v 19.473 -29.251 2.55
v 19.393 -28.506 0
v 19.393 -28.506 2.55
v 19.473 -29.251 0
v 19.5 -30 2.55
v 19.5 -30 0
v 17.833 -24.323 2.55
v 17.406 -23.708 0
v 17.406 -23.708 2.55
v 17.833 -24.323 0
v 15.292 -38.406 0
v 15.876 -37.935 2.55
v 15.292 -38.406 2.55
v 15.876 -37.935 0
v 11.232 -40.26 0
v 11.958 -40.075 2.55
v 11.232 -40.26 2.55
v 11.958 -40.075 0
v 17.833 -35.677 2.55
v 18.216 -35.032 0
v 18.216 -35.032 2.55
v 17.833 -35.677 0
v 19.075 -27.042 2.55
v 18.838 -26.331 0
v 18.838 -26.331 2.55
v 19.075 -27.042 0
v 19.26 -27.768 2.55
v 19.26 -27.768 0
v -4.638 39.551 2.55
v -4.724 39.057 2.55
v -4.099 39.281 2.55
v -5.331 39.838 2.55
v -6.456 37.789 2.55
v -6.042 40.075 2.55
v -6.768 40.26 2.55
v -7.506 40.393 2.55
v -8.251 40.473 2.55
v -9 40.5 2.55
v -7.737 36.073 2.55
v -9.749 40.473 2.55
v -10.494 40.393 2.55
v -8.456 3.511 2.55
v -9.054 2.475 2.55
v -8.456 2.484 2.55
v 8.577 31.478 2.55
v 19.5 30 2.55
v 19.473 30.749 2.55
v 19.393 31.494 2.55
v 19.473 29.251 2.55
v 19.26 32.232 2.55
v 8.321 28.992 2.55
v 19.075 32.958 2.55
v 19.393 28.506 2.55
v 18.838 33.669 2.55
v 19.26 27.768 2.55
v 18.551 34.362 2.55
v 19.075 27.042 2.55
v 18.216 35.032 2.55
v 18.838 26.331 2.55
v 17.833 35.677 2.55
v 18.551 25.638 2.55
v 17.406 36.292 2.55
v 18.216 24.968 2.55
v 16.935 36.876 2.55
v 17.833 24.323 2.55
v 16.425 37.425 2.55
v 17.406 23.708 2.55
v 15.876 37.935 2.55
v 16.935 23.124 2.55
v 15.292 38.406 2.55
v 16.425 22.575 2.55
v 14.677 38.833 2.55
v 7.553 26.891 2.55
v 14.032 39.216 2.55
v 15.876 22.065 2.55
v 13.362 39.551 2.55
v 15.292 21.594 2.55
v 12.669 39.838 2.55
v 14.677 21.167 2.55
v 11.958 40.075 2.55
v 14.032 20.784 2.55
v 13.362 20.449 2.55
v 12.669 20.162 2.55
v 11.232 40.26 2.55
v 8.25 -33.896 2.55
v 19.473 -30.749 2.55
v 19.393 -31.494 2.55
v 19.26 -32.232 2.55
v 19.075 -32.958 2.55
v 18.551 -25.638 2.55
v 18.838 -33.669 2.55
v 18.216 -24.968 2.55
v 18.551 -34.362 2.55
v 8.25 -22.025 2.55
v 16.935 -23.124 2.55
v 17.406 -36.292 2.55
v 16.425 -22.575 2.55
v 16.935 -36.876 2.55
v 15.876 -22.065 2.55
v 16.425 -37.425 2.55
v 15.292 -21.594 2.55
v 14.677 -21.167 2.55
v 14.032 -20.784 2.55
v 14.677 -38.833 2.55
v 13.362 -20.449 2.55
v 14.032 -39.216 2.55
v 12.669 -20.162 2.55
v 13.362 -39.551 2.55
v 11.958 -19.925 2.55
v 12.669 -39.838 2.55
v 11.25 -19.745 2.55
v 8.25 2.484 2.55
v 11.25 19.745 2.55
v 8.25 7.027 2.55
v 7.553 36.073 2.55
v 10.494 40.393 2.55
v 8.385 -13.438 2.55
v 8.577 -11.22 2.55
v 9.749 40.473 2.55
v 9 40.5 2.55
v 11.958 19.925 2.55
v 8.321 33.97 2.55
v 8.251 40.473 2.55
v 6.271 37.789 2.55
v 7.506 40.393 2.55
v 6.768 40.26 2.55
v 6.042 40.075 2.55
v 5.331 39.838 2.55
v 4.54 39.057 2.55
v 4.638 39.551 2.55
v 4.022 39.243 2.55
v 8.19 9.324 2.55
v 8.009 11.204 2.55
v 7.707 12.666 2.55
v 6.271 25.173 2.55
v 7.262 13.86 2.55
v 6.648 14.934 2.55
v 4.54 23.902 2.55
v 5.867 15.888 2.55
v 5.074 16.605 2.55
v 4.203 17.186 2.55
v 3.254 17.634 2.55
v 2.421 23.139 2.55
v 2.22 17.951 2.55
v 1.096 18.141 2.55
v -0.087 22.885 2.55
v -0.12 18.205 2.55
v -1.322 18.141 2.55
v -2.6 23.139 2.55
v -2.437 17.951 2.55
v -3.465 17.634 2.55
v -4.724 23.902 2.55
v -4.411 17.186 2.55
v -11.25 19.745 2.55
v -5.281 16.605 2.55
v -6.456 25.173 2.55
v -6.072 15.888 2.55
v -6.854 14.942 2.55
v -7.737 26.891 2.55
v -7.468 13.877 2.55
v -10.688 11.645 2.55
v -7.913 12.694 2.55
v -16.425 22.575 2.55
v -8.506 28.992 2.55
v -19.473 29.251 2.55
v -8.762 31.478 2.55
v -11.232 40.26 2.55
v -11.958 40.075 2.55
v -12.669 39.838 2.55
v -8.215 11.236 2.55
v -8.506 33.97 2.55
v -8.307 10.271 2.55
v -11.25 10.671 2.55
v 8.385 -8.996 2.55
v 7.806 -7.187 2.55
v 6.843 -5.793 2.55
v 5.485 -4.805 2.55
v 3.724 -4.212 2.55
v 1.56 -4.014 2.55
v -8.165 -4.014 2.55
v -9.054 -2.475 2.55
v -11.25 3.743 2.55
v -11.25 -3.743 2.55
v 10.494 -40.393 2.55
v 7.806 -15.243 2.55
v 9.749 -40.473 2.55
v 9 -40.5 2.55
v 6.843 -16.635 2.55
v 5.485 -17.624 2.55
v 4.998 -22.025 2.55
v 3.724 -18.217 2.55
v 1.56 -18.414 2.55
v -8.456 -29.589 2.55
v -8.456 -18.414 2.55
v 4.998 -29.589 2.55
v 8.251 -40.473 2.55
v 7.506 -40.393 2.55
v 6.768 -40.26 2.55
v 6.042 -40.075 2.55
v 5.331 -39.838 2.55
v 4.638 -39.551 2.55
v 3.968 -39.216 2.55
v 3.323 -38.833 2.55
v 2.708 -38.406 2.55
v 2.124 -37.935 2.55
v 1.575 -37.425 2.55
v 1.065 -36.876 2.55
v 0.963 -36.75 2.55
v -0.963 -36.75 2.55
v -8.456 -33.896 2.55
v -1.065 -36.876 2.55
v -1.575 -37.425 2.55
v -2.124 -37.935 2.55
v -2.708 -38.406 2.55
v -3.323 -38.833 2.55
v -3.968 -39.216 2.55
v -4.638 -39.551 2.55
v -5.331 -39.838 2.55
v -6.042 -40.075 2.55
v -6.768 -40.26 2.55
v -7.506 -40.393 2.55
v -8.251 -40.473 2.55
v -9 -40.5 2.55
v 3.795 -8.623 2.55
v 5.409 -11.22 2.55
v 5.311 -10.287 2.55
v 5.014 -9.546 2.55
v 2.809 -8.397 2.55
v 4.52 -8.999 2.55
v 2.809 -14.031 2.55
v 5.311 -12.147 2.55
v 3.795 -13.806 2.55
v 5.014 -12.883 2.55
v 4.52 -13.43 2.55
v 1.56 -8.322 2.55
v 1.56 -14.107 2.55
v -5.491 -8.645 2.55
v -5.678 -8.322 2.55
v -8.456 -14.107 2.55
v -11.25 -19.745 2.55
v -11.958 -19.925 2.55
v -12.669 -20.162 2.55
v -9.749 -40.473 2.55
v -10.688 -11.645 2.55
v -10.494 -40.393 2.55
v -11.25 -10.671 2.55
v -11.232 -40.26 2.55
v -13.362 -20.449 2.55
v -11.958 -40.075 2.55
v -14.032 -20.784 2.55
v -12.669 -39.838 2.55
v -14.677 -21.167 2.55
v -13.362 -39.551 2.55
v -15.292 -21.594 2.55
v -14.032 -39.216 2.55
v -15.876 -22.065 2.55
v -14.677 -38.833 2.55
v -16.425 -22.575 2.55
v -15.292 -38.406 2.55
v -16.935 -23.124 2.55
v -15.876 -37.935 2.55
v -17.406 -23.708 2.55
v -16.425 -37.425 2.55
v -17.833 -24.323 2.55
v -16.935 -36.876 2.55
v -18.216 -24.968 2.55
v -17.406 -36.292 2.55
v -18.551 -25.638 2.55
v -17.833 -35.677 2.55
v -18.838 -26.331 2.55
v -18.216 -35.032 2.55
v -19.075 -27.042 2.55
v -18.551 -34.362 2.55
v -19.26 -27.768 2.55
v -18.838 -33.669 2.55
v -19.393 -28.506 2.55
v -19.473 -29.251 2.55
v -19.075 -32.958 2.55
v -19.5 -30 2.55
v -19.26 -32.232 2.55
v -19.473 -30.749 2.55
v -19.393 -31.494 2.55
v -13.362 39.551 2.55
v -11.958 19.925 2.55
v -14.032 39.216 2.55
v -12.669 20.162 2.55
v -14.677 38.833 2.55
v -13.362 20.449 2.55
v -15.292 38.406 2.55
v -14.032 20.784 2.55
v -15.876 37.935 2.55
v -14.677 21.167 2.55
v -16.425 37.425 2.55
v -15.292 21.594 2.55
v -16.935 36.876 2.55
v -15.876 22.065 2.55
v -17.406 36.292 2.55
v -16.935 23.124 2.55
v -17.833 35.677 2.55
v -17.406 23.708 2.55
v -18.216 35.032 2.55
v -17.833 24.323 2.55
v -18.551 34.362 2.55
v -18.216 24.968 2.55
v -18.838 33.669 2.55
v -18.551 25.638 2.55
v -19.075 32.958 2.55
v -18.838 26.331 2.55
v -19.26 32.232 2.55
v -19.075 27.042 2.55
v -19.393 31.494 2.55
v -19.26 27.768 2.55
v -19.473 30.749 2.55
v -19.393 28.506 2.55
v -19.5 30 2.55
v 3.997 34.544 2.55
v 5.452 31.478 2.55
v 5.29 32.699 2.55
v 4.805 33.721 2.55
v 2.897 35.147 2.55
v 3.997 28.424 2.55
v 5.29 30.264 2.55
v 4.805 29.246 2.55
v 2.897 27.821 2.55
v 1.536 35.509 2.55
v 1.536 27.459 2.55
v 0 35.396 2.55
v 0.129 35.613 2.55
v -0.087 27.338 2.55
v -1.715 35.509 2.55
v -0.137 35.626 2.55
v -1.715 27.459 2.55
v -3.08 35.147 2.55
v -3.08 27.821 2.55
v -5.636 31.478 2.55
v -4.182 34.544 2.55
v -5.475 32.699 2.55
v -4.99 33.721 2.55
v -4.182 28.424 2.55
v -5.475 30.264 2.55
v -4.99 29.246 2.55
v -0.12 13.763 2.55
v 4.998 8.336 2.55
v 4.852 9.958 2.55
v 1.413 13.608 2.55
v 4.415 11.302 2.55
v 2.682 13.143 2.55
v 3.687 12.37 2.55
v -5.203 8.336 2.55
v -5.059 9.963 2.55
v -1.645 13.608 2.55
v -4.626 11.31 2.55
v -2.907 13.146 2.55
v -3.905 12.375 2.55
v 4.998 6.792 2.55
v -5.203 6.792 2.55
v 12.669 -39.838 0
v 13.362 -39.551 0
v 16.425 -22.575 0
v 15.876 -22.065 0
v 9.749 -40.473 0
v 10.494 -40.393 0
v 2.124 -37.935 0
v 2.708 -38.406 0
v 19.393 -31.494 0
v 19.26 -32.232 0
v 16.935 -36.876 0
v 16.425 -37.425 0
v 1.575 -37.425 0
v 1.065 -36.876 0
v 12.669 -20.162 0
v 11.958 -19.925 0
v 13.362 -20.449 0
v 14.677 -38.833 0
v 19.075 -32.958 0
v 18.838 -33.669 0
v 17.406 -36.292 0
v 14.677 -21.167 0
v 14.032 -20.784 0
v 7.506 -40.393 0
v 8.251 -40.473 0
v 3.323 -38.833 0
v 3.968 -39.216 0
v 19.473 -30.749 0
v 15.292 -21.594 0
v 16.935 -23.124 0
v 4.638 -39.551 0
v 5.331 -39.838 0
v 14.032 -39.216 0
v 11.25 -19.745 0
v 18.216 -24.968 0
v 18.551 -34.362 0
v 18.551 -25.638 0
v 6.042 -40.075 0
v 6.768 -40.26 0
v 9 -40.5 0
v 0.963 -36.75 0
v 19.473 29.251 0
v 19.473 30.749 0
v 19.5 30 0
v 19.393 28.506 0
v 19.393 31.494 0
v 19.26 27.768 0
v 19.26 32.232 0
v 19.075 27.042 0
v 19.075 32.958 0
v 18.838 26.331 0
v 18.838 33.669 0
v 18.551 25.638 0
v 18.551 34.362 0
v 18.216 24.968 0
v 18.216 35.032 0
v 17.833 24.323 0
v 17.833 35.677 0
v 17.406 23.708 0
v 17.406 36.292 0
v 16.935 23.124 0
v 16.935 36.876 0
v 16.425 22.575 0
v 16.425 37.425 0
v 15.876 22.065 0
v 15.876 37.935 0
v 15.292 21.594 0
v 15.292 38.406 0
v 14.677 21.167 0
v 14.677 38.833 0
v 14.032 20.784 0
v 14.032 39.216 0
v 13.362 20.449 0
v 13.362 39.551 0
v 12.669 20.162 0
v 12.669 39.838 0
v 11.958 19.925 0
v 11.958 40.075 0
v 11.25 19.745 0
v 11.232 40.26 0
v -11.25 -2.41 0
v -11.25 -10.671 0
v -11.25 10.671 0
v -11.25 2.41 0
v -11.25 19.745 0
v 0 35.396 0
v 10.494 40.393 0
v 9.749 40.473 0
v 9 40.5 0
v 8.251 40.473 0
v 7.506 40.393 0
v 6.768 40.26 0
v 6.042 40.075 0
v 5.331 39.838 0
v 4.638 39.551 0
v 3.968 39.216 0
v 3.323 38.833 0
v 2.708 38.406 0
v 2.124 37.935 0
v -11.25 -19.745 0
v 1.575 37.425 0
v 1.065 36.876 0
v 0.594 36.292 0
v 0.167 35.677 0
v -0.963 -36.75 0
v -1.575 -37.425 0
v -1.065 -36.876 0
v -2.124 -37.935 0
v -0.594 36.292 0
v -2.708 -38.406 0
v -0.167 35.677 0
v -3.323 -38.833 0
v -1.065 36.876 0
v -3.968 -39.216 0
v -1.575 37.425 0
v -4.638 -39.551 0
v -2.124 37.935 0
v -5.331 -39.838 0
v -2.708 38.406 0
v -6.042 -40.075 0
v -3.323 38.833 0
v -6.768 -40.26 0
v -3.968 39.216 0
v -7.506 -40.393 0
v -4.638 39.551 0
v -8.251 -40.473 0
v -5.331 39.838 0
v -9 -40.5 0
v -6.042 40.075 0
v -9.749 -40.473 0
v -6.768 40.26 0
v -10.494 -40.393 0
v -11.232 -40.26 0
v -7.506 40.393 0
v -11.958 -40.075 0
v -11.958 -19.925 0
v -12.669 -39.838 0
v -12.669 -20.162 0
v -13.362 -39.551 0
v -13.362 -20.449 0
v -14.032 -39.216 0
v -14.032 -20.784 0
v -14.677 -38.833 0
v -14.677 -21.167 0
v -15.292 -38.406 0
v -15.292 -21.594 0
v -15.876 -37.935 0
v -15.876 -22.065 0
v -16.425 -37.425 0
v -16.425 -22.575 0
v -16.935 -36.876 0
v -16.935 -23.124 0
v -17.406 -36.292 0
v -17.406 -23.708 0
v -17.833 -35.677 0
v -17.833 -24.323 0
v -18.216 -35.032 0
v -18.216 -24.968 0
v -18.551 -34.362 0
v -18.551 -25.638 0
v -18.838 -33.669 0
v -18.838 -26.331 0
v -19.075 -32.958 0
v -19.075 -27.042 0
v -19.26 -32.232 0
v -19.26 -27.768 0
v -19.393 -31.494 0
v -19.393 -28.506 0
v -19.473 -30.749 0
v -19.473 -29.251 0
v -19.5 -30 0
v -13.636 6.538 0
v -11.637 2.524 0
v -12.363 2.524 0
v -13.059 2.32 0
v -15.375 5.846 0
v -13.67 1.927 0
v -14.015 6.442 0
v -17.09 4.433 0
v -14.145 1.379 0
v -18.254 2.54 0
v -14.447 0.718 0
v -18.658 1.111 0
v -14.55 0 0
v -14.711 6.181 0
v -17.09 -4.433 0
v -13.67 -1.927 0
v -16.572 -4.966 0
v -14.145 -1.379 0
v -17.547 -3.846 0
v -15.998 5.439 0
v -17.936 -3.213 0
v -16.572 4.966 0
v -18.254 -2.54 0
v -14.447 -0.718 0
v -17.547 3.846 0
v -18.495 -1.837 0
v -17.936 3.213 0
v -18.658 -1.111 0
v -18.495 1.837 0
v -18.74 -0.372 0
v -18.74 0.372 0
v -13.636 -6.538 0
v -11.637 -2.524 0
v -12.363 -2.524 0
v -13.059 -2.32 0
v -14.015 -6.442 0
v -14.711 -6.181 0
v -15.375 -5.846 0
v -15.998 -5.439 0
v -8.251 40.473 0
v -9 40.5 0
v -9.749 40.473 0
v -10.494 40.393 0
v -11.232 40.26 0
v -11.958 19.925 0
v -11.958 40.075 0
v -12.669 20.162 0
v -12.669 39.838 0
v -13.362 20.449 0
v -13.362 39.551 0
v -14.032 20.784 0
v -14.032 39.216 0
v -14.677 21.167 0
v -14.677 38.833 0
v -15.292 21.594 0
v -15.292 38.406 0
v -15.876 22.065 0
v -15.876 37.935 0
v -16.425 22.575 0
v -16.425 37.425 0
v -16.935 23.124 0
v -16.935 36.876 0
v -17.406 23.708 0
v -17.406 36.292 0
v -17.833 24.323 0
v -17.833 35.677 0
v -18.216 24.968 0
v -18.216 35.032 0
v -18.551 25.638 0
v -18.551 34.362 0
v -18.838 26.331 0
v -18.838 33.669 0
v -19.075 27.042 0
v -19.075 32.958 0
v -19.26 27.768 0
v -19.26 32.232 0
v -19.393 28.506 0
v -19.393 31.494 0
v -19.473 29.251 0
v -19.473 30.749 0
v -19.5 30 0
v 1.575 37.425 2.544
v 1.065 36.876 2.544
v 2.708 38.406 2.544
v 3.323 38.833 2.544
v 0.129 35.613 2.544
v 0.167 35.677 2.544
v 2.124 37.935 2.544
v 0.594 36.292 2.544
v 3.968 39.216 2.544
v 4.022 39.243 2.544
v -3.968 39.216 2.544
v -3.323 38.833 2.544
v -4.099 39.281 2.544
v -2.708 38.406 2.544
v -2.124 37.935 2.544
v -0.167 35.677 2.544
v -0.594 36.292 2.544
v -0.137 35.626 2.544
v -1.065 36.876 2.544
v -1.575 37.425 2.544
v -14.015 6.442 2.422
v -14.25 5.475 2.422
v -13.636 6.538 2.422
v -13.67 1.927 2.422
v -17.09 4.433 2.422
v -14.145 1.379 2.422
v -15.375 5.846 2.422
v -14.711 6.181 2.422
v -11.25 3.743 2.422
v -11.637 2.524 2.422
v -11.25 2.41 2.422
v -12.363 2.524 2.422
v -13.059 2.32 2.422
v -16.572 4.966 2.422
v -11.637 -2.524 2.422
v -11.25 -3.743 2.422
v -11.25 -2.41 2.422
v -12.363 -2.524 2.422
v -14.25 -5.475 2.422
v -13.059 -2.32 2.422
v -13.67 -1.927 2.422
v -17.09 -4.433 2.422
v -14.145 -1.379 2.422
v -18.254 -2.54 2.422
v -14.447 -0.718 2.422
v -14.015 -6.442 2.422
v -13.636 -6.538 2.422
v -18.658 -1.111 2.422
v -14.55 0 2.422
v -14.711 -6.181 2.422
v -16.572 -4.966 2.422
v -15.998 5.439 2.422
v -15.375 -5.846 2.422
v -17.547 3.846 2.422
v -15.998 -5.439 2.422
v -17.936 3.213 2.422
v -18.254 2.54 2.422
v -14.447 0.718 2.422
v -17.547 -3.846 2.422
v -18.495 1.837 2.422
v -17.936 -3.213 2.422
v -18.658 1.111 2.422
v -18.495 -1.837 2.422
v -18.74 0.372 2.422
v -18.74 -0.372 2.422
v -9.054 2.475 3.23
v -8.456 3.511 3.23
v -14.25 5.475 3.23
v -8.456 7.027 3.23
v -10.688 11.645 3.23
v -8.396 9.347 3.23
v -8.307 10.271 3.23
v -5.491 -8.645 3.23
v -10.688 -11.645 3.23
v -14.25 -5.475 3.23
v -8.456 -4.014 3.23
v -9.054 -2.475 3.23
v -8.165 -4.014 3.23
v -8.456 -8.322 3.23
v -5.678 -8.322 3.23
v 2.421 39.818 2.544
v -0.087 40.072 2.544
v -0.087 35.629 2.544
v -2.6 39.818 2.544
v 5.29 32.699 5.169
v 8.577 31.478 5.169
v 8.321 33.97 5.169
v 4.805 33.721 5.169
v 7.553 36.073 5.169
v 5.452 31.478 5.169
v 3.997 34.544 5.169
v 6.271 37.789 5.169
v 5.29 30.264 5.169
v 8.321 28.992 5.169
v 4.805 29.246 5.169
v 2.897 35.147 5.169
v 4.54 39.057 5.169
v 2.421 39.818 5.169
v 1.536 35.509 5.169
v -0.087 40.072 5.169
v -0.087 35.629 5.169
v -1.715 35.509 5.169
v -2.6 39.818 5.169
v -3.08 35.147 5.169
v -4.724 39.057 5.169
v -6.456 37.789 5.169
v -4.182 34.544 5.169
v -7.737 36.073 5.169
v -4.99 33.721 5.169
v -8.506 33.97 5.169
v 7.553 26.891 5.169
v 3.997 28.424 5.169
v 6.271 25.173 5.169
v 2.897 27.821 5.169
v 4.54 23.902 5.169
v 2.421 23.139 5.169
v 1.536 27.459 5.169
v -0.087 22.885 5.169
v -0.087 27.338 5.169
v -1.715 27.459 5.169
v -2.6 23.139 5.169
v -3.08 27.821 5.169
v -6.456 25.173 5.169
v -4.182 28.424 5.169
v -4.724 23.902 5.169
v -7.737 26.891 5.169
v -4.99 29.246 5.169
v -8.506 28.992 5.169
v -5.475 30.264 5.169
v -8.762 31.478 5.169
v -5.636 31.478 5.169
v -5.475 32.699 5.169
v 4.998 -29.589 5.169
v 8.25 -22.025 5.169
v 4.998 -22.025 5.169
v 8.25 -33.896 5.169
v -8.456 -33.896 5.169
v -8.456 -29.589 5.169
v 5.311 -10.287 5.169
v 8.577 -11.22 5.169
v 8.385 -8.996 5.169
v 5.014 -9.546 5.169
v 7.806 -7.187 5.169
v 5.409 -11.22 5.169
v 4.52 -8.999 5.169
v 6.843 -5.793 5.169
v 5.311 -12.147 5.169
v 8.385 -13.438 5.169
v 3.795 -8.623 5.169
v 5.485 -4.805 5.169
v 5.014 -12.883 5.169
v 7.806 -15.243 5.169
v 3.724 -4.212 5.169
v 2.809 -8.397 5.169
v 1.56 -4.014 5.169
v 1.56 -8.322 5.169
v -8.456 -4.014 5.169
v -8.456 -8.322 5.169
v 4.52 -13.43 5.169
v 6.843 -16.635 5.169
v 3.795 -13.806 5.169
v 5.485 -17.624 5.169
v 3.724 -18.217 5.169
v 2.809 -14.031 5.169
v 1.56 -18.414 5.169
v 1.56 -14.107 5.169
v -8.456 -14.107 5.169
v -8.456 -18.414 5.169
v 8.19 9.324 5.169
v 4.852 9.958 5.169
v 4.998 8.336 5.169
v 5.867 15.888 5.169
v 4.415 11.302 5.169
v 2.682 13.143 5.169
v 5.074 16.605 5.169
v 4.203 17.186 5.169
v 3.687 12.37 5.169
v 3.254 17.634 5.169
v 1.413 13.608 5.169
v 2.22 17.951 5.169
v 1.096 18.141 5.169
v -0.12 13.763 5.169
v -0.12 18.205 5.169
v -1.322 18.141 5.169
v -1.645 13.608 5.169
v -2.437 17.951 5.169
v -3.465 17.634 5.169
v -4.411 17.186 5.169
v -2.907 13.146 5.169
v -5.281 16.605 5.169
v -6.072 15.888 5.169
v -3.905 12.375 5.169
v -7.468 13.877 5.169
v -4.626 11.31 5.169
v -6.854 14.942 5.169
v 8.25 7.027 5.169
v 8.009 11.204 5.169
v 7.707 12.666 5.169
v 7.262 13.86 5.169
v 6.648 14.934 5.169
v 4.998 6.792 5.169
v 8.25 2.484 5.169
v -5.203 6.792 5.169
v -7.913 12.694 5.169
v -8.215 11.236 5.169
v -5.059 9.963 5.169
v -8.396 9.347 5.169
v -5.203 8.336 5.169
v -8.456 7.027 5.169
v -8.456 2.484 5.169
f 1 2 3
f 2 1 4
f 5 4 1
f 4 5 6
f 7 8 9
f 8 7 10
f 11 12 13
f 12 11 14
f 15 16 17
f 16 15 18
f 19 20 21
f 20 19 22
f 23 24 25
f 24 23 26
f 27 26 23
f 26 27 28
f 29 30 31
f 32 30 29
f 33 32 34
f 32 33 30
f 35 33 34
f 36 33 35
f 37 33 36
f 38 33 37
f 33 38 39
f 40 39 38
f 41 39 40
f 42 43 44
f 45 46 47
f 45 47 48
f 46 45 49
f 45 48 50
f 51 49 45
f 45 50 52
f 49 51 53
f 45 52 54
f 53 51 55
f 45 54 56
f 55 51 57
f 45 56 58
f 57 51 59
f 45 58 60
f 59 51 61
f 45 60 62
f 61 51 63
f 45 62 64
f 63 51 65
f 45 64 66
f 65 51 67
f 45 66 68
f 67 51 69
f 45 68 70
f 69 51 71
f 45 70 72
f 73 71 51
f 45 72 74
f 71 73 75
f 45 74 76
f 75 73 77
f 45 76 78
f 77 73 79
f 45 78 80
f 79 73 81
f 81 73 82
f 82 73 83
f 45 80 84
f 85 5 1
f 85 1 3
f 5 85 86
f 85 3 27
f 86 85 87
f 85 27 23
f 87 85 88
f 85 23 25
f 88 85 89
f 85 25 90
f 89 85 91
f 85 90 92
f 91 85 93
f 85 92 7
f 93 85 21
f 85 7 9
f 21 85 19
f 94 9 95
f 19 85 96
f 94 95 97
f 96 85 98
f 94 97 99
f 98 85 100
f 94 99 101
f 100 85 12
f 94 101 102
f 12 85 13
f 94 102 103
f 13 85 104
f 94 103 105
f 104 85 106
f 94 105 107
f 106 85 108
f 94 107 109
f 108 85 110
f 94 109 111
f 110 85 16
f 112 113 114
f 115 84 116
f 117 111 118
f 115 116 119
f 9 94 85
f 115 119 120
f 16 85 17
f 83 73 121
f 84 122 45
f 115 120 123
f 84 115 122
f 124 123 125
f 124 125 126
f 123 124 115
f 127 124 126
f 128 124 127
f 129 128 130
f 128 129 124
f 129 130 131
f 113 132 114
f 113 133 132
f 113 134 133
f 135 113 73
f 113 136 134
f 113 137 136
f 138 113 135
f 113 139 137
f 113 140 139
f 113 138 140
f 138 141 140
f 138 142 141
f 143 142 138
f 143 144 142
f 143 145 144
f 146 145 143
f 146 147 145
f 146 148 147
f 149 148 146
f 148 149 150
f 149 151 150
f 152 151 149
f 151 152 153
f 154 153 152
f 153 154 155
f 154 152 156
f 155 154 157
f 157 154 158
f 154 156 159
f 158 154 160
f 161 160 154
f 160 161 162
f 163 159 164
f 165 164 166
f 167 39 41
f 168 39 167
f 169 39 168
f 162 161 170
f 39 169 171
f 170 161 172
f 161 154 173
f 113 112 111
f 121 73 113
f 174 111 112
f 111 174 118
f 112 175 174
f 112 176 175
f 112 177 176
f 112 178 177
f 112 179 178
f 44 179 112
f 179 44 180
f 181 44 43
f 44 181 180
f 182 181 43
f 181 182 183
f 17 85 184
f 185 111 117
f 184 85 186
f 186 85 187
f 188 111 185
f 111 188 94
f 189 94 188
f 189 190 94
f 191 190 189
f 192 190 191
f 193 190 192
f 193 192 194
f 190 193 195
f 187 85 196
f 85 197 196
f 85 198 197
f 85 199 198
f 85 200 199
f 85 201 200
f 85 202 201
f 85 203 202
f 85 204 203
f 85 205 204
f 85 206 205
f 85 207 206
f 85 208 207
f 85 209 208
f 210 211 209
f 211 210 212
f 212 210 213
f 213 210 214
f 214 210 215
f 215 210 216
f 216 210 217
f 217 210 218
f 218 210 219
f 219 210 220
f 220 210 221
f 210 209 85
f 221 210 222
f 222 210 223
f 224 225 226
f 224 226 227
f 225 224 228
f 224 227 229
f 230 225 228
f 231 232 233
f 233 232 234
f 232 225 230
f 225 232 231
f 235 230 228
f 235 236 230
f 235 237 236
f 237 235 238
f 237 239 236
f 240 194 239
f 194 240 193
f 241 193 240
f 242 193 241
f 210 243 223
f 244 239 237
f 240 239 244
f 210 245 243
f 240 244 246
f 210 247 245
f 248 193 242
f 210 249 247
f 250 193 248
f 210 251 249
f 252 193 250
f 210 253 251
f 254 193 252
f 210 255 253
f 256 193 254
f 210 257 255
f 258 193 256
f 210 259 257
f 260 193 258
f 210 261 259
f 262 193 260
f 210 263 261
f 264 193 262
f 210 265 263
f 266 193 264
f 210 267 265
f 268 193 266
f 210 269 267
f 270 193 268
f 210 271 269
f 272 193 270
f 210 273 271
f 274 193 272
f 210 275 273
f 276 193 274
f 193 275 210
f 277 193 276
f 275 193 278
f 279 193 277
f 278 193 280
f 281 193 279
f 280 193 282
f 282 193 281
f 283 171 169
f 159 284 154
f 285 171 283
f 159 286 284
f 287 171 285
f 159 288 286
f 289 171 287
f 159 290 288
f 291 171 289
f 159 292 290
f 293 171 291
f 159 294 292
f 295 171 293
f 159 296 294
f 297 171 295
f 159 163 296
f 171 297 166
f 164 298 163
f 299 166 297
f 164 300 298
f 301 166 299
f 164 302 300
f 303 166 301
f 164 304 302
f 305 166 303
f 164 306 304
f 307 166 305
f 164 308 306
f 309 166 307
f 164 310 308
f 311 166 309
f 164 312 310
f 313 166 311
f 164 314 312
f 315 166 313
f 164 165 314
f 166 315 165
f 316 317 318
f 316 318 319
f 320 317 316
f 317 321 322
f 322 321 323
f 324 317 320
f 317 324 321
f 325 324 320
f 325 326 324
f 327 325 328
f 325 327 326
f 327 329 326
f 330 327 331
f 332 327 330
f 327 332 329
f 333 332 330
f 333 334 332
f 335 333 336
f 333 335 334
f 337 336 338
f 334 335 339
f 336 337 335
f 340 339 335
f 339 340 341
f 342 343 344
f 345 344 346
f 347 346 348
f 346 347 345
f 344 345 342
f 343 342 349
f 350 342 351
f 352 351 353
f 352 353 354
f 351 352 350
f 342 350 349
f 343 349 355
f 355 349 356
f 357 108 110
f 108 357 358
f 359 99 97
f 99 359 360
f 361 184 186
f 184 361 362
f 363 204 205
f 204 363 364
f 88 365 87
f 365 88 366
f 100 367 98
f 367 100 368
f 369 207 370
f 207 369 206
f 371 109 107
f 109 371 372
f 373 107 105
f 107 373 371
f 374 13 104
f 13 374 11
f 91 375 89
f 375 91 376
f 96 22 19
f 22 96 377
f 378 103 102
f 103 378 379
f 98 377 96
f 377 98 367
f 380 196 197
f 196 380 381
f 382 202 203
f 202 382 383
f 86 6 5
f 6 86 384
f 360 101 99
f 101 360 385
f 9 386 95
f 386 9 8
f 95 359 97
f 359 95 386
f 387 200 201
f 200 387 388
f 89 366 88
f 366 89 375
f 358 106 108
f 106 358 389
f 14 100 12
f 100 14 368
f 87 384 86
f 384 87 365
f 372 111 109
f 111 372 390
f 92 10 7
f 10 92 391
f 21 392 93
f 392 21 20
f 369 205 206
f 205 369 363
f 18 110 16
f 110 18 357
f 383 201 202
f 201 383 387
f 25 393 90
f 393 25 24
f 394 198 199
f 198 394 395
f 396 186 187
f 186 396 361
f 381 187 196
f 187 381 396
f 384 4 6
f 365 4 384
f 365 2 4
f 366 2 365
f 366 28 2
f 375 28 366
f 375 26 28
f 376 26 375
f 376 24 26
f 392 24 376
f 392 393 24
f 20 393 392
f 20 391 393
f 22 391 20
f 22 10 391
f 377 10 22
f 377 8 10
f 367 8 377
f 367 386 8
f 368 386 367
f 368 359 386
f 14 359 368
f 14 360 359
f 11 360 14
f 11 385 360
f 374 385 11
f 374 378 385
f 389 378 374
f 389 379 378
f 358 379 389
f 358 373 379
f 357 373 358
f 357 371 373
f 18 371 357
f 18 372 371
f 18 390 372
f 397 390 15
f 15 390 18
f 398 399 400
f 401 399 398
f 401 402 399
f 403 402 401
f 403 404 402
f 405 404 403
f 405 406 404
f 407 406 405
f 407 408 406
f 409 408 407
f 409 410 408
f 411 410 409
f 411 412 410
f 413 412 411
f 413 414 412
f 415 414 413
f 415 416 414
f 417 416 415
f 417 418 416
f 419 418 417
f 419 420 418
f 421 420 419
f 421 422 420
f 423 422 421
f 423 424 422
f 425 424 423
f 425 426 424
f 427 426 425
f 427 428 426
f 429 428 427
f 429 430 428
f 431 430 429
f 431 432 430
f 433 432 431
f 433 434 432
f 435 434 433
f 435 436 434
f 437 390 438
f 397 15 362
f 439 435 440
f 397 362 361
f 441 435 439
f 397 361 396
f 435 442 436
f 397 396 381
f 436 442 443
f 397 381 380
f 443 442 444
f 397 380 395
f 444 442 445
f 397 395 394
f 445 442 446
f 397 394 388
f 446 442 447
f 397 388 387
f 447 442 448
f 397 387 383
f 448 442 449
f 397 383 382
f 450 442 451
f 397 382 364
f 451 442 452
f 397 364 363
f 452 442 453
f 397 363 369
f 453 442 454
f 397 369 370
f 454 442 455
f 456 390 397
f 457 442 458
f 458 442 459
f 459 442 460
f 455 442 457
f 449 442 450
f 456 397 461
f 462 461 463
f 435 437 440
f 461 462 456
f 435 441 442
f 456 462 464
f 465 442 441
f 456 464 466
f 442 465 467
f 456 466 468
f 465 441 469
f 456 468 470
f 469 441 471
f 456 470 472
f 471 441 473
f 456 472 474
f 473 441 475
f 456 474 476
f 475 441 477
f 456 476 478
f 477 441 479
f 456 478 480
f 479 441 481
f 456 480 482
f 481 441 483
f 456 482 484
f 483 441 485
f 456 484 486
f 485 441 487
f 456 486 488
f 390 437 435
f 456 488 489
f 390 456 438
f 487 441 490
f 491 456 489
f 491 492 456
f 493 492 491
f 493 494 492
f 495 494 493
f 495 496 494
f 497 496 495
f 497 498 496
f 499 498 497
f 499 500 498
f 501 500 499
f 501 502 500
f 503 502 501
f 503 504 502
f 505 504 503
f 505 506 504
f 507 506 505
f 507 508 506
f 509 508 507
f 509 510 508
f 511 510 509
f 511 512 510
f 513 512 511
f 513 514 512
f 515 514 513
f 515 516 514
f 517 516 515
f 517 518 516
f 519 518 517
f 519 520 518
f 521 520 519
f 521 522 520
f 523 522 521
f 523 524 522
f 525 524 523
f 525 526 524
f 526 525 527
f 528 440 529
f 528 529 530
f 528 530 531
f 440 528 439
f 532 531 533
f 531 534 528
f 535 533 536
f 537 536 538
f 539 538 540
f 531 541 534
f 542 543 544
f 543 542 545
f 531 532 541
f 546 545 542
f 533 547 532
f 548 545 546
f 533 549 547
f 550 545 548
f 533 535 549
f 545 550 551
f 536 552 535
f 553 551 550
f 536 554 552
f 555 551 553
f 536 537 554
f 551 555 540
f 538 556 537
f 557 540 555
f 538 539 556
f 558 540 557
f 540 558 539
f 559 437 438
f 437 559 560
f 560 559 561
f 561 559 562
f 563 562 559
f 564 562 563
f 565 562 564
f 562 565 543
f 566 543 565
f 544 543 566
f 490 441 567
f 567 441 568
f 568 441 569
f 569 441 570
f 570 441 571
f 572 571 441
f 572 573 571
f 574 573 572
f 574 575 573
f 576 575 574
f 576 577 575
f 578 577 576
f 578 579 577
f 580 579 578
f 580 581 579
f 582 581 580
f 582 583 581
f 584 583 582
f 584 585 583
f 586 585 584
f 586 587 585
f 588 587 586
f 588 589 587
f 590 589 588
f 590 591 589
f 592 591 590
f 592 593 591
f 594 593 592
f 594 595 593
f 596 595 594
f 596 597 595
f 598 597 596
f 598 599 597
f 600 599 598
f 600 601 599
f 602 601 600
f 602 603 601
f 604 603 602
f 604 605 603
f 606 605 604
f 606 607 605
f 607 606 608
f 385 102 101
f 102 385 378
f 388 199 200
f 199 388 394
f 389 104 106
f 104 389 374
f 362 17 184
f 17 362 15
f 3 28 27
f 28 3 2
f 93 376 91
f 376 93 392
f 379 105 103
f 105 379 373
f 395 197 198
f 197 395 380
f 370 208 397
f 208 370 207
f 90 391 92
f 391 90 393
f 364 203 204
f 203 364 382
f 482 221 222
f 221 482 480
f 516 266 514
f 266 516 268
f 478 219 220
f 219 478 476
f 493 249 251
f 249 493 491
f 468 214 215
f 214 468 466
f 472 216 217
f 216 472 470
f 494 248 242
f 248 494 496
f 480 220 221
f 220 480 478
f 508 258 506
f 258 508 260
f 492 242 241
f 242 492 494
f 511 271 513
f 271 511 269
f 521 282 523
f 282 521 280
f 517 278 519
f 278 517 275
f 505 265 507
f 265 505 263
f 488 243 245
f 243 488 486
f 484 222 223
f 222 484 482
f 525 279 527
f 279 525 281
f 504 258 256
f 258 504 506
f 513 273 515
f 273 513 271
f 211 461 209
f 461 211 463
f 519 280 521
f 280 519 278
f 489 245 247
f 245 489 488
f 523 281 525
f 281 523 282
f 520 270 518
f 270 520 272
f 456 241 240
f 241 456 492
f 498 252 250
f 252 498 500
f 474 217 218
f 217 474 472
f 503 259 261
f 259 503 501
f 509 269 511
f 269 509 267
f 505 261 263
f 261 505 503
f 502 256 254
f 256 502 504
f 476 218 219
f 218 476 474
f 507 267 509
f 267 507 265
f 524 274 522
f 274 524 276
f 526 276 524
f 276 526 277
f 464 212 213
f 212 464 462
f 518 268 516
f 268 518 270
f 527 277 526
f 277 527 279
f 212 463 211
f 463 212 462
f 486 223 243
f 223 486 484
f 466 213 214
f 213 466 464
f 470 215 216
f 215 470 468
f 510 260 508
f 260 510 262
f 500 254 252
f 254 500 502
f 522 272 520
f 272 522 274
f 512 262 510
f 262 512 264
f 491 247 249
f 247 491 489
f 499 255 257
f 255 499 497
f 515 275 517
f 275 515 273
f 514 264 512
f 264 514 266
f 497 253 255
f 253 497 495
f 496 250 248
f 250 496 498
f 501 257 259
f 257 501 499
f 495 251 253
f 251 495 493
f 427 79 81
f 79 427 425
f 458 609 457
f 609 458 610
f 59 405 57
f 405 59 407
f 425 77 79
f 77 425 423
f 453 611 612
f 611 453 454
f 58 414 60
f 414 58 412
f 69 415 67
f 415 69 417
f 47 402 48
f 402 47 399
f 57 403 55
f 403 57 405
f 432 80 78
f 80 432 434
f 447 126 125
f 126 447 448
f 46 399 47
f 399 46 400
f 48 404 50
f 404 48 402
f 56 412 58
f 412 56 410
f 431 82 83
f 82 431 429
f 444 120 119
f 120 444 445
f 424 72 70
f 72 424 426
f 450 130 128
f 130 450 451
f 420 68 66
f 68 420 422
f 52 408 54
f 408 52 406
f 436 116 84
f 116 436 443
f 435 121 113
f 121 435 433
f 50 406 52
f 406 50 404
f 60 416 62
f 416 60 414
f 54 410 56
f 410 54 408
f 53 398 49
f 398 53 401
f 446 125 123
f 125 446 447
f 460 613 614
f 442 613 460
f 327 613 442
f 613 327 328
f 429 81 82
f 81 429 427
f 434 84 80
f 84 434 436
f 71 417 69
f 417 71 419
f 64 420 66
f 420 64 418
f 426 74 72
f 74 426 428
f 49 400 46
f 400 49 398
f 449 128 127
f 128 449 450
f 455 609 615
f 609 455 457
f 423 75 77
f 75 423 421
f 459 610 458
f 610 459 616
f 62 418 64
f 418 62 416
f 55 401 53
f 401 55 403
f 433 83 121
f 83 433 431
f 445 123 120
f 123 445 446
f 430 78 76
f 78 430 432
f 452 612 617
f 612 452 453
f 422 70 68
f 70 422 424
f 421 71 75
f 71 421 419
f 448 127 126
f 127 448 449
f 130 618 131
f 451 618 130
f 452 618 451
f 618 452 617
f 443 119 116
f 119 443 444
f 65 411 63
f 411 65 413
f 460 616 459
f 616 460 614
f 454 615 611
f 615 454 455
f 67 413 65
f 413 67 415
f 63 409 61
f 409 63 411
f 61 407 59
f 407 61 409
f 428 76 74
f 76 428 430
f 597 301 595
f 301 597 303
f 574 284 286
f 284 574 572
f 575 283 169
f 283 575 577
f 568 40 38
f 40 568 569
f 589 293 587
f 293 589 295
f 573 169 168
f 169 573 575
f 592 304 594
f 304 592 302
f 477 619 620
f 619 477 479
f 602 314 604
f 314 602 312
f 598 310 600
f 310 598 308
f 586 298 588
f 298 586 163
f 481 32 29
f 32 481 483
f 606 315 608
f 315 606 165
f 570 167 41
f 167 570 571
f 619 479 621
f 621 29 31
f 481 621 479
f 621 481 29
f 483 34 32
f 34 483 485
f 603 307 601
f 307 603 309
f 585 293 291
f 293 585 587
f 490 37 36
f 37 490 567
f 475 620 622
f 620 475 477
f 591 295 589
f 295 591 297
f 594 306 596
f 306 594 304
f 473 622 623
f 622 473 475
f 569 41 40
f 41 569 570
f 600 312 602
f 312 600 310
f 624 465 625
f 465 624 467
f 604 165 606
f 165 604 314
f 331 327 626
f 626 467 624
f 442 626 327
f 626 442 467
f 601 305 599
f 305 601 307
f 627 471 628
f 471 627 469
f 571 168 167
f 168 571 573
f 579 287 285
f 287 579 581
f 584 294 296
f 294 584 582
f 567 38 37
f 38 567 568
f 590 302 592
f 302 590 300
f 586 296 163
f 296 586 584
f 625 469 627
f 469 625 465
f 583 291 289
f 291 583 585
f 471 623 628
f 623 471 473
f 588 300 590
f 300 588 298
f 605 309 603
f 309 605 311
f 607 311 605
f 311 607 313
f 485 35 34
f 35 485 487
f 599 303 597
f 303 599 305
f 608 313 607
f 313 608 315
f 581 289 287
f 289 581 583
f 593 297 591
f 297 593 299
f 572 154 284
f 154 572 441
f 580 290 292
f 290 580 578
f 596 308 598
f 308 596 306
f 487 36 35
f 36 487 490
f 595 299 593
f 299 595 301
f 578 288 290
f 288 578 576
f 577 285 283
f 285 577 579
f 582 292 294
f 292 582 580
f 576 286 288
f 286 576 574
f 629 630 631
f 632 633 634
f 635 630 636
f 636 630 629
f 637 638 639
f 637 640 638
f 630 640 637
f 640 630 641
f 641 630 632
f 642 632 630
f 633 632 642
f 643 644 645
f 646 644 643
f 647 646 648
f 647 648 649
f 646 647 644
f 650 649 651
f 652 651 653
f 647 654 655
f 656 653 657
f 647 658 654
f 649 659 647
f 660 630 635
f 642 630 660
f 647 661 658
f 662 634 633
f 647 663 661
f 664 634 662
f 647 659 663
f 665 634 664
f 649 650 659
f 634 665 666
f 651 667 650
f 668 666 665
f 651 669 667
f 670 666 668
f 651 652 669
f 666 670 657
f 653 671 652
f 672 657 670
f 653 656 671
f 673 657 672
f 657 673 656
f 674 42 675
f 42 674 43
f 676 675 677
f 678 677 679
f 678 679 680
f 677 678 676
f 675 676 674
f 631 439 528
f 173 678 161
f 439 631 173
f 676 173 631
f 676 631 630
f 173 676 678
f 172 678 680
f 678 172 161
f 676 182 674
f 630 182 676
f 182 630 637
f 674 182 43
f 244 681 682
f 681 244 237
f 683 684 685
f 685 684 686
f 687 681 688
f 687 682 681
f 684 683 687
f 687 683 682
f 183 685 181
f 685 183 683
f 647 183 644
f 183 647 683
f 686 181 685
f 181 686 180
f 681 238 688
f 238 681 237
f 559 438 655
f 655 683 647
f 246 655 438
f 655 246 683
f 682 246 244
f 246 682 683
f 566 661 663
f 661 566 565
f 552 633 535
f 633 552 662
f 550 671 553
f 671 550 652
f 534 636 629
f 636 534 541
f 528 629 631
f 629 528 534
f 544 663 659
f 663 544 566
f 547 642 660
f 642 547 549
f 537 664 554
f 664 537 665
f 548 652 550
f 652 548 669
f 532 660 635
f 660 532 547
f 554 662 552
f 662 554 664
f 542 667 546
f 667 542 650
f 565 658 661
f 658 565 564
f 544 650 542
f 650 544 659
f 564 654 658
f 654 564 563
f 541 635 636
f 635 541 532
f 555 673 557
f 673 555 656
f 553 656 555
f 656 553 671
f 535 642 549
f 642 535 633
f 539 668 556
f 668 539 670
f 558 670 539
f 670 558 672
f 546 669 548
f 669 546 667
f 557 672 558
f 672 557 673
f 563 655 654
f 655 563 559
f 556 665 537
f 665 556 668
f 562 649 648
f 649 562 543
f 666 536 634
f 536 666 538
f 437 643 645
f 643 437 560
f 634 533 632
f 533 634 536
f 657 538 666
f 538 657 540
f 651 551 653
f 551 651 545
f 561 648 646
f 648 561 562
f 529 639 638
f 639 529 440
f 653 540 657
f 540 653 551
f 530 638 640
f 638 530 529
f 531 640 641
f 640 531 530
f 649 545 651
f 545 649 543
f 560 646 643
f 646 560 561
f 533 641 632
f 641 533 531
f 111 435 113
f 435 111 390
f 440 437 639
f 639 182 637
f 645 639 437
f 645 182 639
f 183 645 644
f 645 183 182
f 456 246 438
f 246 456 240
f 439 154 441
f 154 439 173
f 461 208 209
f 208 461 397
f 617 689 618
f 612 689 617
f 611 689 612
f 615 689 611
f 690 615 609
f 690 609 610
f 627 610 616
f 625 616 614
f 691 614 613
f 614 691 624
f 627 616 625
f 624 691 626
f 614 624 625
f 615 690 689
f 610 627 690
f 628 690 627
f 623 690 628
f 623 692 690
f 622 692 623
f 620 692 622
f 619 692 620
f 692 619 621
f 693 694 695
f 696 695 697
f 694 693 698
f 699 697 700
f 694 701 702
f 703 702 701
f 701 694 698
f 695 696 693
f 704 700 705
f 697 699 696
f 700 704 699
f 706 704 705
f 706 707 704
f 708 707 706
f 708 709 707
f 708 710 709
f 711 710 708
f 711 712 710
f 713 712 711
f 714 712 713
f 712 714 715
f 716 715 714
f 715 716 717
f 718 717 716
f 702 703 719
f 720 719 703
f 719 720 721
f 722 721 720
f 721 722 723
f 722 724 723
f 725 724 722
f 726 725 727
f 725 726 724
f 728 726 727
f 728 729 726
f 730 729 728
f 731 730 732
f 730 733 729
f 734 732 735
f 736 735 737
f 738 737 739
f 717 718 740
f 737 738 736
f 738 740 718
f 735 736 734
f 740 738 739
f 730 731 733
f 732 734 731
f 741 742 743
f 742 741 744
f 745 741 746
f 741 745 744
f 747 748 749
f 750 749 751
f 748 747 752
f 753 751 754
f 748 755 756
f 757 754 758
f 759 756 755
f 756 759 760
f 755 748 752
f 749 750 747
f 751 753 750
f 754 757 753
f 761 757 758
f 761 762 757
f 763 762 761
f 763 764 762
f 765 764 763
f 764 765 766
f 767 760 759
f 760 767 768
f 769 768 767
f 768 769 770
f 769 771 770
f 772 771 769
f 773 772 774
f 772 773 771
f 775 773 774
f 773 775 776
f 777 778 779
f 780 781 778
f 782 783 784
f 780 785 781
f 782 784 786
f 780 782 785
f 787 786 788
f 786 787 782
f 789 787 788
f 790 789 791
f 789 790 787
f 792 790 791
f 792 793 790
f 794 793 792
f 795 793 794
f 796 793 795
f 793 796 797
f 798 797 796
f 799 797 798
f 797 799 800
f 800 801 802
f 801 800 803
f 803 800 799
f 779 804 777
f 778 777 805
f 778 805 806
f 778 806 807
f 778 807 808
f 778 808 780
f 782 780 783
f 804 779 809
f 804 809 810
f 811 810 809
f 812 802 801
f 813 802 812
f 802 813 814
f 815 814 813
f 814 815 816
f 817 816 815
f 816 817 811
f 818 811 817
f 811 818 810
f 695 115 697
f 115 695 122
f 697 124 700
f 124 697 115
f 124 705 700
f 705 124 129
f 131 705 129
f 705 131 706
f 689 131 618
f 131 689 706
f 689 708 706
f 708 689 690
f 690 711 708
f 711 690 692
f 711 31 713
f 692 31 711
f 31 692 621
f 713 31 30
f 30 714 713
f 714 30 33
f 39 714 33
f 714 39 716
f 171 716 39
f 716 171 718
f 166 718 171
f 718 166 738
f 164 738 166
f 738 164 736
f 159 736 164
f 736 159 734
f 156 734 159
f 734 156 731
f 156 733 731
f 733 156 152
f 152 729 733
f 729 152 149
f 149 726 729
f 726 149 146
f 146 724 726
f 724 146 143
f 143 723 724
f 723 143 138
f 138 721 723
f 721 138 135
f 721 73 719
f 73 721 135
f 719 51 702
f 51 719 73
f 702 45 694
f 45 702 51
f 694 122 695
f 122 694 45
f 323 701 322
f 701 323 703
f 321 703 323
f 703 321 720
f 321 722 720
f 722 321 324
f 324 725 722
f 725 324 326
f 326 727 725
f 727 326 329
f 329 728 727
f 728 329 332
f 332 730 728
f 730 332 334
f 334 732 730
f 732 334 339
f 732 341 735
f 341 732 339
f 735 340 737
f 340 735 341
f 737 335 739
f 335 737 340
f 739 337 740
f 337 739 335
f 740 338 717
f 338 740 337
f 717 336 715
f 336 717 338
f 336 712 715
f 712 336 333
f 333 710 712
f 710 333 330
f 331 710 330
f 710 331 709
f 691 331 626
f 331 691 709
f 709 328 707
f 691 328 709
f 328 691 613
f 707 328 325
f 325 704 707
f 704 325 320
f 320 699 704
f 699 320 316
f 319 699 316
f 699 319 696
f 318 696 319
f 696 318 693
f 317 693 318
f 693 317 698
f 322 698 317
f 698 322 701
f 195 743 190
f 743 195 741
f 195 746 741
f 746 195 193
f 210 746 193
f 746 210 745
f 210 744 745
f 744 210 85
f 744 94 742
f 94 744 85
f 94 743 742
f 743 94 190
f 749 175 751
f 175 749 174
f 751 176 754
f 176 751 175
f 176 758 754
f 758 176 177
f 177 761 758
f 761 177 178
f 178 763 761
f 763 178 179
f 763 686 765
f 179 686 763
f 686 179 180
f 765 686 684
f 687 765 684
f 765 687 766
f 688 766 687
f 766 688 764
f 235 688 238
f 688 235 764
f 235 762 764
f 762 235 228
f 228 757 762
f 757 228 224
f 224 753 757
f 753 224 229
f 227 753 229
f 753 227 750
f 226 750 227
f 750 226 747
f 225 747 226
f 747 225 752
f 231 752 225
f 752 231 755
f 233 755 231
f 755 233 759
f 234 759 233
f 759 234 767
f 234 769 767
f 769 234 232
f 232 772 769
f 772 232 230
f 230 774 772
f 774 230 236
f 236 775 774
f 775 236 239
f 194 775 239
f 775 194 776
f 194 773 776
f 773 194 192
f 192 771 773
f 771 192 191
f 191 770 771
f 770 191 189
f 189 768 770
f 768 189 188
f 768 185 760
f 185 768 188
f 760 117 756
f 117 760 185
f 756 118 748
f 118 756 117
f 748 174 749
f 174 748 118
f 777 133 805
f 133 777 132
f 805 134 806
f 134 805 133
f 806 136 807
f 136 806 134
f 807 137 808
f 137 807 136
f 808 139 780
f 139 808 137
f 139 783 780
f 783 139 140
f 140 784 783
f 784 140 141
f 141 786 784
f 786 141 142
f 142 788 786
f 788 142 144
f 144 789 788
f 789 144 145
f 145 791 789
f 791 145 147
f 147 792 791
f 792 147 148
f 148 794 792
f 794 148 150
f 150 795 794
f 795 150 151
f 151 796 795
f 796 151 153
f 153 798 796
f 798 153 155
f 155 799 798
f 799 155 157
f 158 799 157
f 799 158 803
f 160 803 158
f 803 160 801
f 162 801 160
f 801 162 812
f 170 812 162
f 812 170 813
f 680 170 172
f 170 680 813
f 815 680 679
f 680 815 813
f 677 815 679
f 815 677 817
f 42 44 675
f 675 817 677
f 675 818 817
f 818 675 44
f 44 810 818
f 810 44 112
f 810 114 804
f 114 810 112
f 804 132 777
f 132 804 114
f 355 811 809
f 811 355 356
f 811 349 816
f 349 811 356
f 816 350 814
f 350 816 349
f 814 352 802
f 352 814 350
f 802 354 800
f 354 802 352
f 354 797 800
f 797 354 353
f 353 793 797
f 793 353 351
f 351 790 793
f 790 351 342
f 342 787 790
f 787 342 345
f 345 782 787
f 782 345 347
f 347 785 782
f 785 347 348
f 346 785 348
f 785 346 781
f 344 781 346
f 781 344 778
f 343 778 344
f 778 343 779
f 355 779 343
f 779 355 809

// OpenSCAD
//set this to how thick you want the tag
bone_height = 3.4;

pet_name="LUDO";
/// phone_number="123-555-1212";

font_face="San Franscisco:style=Bold";
/// font_face="Consolas";

font_thickness=3.5;
delta = 1/128;

tag_attachment_outer_diameter = 9;
tag_attachment_inner_diameter = 3.4;
tag_attachment_width = (tag_attachment_outer_diameter - tag_attachment_inner_diameter);
tag_attachment_height = bone_height*95/100;
tag_attachment_flare_width = 8;

module __Customizer_Limit__ () {}

$fa=1;
$fs=1;

module t(t, font_size, align_scale, character_spacing){
 translate([-1,(-len(t)*align_scale),bone_height - delta])
   rotate([0, 0, 90])
    linear_extrude(height = font_thickness)
      text(t, font_size, font = str(font_face), spacing = character_spacing, $fn = 20);
}
//bone
//left side of bone

scale([1,1,1]*0.75) {
translate([-12,-40,0])
{
    translate([24,0,0]) cylinder(h=bone_height, r=14);
    cylinder(h=bone_height, r=14);
};
//right side of bone
translate([-12,40,0])
{
    translate([24,0,0]) cylinder(h=bone_height, r=14);
    cylinder(h=bone_height, r=14);
};

//center of bone
translate([-15,-49,0]) cube([30,90,bone_height]);

// TEXT
translate([12, -12, 0]) t(pet_name,    22, 9.0, 1.15);
// translate([1.5+11.5, 0, -0.2]) t(phone_number, 10, 3.9, 1.1);

//tag attachment
difference(){
    union() {
        translate([-16,0,0]) {

            cylinder(r=tag_attachment_outer_diameter, h=tag_attachment_height);

            // add flares at attachment point for more area
            translate([-3,tag_attachment_outer_diameter/2 + tag_attachment_width/2 ,0])
            {
                rotate([0,0,-45]) {
                    cube([tag_attachment_flare_width , tag_attachment_flare_width ,tag_attachment_height]);
                }
                rotate([0,0, -30 ]) {
                    cube([tag_attachment_flare_width , tag_attachment_flare_width + 1.5 ,tag_attachment_height * 4/3]);
                }

            };
           translate([-3,-(tag_attachment_outer_diameter/2 + tag_attachment_width/2) ,0])
            {
                rotate([0,0,-45]) {
                    cube([tag_attachment_flare_width , tag_attachment_flare_width ,tag_attachment_height]);
                }
                rotate([0,0,-60]) {
                    cube([tag_attachment_flare_width + 1.5 , tag_attachment_flare_width ,tag_attachment_height * 4/3]);
                }

            };
        }
    }
    //prevents non-manifold
    translate([-16,0,-1]) cylinder(r=tag_attachment_inner_diameter, h=((bone_height*2/3)+2));
}


translate([-16,0,0]) {

  // add flares at attachment point for more area
  translate([-3,tag_attachment_outer_diameter/2 + tag_attachment_width/2 ,0])
  {
    rotate([0,0,-45]) {
      cube([tag_attachment_flare_width , tag_attachment_flare_width ,tag_attachment_height]);
    }
  };
  translate([-3,-(tag_attachment_outer_diameter/2 + tag_attachment_width/2) ,0])
  {
    rotate([0,0,-45]) {
      cube([tag_attachment_flare_width , tag_attachment_flare_width ,tag_attachment_height]);
    }
  };
}


}
